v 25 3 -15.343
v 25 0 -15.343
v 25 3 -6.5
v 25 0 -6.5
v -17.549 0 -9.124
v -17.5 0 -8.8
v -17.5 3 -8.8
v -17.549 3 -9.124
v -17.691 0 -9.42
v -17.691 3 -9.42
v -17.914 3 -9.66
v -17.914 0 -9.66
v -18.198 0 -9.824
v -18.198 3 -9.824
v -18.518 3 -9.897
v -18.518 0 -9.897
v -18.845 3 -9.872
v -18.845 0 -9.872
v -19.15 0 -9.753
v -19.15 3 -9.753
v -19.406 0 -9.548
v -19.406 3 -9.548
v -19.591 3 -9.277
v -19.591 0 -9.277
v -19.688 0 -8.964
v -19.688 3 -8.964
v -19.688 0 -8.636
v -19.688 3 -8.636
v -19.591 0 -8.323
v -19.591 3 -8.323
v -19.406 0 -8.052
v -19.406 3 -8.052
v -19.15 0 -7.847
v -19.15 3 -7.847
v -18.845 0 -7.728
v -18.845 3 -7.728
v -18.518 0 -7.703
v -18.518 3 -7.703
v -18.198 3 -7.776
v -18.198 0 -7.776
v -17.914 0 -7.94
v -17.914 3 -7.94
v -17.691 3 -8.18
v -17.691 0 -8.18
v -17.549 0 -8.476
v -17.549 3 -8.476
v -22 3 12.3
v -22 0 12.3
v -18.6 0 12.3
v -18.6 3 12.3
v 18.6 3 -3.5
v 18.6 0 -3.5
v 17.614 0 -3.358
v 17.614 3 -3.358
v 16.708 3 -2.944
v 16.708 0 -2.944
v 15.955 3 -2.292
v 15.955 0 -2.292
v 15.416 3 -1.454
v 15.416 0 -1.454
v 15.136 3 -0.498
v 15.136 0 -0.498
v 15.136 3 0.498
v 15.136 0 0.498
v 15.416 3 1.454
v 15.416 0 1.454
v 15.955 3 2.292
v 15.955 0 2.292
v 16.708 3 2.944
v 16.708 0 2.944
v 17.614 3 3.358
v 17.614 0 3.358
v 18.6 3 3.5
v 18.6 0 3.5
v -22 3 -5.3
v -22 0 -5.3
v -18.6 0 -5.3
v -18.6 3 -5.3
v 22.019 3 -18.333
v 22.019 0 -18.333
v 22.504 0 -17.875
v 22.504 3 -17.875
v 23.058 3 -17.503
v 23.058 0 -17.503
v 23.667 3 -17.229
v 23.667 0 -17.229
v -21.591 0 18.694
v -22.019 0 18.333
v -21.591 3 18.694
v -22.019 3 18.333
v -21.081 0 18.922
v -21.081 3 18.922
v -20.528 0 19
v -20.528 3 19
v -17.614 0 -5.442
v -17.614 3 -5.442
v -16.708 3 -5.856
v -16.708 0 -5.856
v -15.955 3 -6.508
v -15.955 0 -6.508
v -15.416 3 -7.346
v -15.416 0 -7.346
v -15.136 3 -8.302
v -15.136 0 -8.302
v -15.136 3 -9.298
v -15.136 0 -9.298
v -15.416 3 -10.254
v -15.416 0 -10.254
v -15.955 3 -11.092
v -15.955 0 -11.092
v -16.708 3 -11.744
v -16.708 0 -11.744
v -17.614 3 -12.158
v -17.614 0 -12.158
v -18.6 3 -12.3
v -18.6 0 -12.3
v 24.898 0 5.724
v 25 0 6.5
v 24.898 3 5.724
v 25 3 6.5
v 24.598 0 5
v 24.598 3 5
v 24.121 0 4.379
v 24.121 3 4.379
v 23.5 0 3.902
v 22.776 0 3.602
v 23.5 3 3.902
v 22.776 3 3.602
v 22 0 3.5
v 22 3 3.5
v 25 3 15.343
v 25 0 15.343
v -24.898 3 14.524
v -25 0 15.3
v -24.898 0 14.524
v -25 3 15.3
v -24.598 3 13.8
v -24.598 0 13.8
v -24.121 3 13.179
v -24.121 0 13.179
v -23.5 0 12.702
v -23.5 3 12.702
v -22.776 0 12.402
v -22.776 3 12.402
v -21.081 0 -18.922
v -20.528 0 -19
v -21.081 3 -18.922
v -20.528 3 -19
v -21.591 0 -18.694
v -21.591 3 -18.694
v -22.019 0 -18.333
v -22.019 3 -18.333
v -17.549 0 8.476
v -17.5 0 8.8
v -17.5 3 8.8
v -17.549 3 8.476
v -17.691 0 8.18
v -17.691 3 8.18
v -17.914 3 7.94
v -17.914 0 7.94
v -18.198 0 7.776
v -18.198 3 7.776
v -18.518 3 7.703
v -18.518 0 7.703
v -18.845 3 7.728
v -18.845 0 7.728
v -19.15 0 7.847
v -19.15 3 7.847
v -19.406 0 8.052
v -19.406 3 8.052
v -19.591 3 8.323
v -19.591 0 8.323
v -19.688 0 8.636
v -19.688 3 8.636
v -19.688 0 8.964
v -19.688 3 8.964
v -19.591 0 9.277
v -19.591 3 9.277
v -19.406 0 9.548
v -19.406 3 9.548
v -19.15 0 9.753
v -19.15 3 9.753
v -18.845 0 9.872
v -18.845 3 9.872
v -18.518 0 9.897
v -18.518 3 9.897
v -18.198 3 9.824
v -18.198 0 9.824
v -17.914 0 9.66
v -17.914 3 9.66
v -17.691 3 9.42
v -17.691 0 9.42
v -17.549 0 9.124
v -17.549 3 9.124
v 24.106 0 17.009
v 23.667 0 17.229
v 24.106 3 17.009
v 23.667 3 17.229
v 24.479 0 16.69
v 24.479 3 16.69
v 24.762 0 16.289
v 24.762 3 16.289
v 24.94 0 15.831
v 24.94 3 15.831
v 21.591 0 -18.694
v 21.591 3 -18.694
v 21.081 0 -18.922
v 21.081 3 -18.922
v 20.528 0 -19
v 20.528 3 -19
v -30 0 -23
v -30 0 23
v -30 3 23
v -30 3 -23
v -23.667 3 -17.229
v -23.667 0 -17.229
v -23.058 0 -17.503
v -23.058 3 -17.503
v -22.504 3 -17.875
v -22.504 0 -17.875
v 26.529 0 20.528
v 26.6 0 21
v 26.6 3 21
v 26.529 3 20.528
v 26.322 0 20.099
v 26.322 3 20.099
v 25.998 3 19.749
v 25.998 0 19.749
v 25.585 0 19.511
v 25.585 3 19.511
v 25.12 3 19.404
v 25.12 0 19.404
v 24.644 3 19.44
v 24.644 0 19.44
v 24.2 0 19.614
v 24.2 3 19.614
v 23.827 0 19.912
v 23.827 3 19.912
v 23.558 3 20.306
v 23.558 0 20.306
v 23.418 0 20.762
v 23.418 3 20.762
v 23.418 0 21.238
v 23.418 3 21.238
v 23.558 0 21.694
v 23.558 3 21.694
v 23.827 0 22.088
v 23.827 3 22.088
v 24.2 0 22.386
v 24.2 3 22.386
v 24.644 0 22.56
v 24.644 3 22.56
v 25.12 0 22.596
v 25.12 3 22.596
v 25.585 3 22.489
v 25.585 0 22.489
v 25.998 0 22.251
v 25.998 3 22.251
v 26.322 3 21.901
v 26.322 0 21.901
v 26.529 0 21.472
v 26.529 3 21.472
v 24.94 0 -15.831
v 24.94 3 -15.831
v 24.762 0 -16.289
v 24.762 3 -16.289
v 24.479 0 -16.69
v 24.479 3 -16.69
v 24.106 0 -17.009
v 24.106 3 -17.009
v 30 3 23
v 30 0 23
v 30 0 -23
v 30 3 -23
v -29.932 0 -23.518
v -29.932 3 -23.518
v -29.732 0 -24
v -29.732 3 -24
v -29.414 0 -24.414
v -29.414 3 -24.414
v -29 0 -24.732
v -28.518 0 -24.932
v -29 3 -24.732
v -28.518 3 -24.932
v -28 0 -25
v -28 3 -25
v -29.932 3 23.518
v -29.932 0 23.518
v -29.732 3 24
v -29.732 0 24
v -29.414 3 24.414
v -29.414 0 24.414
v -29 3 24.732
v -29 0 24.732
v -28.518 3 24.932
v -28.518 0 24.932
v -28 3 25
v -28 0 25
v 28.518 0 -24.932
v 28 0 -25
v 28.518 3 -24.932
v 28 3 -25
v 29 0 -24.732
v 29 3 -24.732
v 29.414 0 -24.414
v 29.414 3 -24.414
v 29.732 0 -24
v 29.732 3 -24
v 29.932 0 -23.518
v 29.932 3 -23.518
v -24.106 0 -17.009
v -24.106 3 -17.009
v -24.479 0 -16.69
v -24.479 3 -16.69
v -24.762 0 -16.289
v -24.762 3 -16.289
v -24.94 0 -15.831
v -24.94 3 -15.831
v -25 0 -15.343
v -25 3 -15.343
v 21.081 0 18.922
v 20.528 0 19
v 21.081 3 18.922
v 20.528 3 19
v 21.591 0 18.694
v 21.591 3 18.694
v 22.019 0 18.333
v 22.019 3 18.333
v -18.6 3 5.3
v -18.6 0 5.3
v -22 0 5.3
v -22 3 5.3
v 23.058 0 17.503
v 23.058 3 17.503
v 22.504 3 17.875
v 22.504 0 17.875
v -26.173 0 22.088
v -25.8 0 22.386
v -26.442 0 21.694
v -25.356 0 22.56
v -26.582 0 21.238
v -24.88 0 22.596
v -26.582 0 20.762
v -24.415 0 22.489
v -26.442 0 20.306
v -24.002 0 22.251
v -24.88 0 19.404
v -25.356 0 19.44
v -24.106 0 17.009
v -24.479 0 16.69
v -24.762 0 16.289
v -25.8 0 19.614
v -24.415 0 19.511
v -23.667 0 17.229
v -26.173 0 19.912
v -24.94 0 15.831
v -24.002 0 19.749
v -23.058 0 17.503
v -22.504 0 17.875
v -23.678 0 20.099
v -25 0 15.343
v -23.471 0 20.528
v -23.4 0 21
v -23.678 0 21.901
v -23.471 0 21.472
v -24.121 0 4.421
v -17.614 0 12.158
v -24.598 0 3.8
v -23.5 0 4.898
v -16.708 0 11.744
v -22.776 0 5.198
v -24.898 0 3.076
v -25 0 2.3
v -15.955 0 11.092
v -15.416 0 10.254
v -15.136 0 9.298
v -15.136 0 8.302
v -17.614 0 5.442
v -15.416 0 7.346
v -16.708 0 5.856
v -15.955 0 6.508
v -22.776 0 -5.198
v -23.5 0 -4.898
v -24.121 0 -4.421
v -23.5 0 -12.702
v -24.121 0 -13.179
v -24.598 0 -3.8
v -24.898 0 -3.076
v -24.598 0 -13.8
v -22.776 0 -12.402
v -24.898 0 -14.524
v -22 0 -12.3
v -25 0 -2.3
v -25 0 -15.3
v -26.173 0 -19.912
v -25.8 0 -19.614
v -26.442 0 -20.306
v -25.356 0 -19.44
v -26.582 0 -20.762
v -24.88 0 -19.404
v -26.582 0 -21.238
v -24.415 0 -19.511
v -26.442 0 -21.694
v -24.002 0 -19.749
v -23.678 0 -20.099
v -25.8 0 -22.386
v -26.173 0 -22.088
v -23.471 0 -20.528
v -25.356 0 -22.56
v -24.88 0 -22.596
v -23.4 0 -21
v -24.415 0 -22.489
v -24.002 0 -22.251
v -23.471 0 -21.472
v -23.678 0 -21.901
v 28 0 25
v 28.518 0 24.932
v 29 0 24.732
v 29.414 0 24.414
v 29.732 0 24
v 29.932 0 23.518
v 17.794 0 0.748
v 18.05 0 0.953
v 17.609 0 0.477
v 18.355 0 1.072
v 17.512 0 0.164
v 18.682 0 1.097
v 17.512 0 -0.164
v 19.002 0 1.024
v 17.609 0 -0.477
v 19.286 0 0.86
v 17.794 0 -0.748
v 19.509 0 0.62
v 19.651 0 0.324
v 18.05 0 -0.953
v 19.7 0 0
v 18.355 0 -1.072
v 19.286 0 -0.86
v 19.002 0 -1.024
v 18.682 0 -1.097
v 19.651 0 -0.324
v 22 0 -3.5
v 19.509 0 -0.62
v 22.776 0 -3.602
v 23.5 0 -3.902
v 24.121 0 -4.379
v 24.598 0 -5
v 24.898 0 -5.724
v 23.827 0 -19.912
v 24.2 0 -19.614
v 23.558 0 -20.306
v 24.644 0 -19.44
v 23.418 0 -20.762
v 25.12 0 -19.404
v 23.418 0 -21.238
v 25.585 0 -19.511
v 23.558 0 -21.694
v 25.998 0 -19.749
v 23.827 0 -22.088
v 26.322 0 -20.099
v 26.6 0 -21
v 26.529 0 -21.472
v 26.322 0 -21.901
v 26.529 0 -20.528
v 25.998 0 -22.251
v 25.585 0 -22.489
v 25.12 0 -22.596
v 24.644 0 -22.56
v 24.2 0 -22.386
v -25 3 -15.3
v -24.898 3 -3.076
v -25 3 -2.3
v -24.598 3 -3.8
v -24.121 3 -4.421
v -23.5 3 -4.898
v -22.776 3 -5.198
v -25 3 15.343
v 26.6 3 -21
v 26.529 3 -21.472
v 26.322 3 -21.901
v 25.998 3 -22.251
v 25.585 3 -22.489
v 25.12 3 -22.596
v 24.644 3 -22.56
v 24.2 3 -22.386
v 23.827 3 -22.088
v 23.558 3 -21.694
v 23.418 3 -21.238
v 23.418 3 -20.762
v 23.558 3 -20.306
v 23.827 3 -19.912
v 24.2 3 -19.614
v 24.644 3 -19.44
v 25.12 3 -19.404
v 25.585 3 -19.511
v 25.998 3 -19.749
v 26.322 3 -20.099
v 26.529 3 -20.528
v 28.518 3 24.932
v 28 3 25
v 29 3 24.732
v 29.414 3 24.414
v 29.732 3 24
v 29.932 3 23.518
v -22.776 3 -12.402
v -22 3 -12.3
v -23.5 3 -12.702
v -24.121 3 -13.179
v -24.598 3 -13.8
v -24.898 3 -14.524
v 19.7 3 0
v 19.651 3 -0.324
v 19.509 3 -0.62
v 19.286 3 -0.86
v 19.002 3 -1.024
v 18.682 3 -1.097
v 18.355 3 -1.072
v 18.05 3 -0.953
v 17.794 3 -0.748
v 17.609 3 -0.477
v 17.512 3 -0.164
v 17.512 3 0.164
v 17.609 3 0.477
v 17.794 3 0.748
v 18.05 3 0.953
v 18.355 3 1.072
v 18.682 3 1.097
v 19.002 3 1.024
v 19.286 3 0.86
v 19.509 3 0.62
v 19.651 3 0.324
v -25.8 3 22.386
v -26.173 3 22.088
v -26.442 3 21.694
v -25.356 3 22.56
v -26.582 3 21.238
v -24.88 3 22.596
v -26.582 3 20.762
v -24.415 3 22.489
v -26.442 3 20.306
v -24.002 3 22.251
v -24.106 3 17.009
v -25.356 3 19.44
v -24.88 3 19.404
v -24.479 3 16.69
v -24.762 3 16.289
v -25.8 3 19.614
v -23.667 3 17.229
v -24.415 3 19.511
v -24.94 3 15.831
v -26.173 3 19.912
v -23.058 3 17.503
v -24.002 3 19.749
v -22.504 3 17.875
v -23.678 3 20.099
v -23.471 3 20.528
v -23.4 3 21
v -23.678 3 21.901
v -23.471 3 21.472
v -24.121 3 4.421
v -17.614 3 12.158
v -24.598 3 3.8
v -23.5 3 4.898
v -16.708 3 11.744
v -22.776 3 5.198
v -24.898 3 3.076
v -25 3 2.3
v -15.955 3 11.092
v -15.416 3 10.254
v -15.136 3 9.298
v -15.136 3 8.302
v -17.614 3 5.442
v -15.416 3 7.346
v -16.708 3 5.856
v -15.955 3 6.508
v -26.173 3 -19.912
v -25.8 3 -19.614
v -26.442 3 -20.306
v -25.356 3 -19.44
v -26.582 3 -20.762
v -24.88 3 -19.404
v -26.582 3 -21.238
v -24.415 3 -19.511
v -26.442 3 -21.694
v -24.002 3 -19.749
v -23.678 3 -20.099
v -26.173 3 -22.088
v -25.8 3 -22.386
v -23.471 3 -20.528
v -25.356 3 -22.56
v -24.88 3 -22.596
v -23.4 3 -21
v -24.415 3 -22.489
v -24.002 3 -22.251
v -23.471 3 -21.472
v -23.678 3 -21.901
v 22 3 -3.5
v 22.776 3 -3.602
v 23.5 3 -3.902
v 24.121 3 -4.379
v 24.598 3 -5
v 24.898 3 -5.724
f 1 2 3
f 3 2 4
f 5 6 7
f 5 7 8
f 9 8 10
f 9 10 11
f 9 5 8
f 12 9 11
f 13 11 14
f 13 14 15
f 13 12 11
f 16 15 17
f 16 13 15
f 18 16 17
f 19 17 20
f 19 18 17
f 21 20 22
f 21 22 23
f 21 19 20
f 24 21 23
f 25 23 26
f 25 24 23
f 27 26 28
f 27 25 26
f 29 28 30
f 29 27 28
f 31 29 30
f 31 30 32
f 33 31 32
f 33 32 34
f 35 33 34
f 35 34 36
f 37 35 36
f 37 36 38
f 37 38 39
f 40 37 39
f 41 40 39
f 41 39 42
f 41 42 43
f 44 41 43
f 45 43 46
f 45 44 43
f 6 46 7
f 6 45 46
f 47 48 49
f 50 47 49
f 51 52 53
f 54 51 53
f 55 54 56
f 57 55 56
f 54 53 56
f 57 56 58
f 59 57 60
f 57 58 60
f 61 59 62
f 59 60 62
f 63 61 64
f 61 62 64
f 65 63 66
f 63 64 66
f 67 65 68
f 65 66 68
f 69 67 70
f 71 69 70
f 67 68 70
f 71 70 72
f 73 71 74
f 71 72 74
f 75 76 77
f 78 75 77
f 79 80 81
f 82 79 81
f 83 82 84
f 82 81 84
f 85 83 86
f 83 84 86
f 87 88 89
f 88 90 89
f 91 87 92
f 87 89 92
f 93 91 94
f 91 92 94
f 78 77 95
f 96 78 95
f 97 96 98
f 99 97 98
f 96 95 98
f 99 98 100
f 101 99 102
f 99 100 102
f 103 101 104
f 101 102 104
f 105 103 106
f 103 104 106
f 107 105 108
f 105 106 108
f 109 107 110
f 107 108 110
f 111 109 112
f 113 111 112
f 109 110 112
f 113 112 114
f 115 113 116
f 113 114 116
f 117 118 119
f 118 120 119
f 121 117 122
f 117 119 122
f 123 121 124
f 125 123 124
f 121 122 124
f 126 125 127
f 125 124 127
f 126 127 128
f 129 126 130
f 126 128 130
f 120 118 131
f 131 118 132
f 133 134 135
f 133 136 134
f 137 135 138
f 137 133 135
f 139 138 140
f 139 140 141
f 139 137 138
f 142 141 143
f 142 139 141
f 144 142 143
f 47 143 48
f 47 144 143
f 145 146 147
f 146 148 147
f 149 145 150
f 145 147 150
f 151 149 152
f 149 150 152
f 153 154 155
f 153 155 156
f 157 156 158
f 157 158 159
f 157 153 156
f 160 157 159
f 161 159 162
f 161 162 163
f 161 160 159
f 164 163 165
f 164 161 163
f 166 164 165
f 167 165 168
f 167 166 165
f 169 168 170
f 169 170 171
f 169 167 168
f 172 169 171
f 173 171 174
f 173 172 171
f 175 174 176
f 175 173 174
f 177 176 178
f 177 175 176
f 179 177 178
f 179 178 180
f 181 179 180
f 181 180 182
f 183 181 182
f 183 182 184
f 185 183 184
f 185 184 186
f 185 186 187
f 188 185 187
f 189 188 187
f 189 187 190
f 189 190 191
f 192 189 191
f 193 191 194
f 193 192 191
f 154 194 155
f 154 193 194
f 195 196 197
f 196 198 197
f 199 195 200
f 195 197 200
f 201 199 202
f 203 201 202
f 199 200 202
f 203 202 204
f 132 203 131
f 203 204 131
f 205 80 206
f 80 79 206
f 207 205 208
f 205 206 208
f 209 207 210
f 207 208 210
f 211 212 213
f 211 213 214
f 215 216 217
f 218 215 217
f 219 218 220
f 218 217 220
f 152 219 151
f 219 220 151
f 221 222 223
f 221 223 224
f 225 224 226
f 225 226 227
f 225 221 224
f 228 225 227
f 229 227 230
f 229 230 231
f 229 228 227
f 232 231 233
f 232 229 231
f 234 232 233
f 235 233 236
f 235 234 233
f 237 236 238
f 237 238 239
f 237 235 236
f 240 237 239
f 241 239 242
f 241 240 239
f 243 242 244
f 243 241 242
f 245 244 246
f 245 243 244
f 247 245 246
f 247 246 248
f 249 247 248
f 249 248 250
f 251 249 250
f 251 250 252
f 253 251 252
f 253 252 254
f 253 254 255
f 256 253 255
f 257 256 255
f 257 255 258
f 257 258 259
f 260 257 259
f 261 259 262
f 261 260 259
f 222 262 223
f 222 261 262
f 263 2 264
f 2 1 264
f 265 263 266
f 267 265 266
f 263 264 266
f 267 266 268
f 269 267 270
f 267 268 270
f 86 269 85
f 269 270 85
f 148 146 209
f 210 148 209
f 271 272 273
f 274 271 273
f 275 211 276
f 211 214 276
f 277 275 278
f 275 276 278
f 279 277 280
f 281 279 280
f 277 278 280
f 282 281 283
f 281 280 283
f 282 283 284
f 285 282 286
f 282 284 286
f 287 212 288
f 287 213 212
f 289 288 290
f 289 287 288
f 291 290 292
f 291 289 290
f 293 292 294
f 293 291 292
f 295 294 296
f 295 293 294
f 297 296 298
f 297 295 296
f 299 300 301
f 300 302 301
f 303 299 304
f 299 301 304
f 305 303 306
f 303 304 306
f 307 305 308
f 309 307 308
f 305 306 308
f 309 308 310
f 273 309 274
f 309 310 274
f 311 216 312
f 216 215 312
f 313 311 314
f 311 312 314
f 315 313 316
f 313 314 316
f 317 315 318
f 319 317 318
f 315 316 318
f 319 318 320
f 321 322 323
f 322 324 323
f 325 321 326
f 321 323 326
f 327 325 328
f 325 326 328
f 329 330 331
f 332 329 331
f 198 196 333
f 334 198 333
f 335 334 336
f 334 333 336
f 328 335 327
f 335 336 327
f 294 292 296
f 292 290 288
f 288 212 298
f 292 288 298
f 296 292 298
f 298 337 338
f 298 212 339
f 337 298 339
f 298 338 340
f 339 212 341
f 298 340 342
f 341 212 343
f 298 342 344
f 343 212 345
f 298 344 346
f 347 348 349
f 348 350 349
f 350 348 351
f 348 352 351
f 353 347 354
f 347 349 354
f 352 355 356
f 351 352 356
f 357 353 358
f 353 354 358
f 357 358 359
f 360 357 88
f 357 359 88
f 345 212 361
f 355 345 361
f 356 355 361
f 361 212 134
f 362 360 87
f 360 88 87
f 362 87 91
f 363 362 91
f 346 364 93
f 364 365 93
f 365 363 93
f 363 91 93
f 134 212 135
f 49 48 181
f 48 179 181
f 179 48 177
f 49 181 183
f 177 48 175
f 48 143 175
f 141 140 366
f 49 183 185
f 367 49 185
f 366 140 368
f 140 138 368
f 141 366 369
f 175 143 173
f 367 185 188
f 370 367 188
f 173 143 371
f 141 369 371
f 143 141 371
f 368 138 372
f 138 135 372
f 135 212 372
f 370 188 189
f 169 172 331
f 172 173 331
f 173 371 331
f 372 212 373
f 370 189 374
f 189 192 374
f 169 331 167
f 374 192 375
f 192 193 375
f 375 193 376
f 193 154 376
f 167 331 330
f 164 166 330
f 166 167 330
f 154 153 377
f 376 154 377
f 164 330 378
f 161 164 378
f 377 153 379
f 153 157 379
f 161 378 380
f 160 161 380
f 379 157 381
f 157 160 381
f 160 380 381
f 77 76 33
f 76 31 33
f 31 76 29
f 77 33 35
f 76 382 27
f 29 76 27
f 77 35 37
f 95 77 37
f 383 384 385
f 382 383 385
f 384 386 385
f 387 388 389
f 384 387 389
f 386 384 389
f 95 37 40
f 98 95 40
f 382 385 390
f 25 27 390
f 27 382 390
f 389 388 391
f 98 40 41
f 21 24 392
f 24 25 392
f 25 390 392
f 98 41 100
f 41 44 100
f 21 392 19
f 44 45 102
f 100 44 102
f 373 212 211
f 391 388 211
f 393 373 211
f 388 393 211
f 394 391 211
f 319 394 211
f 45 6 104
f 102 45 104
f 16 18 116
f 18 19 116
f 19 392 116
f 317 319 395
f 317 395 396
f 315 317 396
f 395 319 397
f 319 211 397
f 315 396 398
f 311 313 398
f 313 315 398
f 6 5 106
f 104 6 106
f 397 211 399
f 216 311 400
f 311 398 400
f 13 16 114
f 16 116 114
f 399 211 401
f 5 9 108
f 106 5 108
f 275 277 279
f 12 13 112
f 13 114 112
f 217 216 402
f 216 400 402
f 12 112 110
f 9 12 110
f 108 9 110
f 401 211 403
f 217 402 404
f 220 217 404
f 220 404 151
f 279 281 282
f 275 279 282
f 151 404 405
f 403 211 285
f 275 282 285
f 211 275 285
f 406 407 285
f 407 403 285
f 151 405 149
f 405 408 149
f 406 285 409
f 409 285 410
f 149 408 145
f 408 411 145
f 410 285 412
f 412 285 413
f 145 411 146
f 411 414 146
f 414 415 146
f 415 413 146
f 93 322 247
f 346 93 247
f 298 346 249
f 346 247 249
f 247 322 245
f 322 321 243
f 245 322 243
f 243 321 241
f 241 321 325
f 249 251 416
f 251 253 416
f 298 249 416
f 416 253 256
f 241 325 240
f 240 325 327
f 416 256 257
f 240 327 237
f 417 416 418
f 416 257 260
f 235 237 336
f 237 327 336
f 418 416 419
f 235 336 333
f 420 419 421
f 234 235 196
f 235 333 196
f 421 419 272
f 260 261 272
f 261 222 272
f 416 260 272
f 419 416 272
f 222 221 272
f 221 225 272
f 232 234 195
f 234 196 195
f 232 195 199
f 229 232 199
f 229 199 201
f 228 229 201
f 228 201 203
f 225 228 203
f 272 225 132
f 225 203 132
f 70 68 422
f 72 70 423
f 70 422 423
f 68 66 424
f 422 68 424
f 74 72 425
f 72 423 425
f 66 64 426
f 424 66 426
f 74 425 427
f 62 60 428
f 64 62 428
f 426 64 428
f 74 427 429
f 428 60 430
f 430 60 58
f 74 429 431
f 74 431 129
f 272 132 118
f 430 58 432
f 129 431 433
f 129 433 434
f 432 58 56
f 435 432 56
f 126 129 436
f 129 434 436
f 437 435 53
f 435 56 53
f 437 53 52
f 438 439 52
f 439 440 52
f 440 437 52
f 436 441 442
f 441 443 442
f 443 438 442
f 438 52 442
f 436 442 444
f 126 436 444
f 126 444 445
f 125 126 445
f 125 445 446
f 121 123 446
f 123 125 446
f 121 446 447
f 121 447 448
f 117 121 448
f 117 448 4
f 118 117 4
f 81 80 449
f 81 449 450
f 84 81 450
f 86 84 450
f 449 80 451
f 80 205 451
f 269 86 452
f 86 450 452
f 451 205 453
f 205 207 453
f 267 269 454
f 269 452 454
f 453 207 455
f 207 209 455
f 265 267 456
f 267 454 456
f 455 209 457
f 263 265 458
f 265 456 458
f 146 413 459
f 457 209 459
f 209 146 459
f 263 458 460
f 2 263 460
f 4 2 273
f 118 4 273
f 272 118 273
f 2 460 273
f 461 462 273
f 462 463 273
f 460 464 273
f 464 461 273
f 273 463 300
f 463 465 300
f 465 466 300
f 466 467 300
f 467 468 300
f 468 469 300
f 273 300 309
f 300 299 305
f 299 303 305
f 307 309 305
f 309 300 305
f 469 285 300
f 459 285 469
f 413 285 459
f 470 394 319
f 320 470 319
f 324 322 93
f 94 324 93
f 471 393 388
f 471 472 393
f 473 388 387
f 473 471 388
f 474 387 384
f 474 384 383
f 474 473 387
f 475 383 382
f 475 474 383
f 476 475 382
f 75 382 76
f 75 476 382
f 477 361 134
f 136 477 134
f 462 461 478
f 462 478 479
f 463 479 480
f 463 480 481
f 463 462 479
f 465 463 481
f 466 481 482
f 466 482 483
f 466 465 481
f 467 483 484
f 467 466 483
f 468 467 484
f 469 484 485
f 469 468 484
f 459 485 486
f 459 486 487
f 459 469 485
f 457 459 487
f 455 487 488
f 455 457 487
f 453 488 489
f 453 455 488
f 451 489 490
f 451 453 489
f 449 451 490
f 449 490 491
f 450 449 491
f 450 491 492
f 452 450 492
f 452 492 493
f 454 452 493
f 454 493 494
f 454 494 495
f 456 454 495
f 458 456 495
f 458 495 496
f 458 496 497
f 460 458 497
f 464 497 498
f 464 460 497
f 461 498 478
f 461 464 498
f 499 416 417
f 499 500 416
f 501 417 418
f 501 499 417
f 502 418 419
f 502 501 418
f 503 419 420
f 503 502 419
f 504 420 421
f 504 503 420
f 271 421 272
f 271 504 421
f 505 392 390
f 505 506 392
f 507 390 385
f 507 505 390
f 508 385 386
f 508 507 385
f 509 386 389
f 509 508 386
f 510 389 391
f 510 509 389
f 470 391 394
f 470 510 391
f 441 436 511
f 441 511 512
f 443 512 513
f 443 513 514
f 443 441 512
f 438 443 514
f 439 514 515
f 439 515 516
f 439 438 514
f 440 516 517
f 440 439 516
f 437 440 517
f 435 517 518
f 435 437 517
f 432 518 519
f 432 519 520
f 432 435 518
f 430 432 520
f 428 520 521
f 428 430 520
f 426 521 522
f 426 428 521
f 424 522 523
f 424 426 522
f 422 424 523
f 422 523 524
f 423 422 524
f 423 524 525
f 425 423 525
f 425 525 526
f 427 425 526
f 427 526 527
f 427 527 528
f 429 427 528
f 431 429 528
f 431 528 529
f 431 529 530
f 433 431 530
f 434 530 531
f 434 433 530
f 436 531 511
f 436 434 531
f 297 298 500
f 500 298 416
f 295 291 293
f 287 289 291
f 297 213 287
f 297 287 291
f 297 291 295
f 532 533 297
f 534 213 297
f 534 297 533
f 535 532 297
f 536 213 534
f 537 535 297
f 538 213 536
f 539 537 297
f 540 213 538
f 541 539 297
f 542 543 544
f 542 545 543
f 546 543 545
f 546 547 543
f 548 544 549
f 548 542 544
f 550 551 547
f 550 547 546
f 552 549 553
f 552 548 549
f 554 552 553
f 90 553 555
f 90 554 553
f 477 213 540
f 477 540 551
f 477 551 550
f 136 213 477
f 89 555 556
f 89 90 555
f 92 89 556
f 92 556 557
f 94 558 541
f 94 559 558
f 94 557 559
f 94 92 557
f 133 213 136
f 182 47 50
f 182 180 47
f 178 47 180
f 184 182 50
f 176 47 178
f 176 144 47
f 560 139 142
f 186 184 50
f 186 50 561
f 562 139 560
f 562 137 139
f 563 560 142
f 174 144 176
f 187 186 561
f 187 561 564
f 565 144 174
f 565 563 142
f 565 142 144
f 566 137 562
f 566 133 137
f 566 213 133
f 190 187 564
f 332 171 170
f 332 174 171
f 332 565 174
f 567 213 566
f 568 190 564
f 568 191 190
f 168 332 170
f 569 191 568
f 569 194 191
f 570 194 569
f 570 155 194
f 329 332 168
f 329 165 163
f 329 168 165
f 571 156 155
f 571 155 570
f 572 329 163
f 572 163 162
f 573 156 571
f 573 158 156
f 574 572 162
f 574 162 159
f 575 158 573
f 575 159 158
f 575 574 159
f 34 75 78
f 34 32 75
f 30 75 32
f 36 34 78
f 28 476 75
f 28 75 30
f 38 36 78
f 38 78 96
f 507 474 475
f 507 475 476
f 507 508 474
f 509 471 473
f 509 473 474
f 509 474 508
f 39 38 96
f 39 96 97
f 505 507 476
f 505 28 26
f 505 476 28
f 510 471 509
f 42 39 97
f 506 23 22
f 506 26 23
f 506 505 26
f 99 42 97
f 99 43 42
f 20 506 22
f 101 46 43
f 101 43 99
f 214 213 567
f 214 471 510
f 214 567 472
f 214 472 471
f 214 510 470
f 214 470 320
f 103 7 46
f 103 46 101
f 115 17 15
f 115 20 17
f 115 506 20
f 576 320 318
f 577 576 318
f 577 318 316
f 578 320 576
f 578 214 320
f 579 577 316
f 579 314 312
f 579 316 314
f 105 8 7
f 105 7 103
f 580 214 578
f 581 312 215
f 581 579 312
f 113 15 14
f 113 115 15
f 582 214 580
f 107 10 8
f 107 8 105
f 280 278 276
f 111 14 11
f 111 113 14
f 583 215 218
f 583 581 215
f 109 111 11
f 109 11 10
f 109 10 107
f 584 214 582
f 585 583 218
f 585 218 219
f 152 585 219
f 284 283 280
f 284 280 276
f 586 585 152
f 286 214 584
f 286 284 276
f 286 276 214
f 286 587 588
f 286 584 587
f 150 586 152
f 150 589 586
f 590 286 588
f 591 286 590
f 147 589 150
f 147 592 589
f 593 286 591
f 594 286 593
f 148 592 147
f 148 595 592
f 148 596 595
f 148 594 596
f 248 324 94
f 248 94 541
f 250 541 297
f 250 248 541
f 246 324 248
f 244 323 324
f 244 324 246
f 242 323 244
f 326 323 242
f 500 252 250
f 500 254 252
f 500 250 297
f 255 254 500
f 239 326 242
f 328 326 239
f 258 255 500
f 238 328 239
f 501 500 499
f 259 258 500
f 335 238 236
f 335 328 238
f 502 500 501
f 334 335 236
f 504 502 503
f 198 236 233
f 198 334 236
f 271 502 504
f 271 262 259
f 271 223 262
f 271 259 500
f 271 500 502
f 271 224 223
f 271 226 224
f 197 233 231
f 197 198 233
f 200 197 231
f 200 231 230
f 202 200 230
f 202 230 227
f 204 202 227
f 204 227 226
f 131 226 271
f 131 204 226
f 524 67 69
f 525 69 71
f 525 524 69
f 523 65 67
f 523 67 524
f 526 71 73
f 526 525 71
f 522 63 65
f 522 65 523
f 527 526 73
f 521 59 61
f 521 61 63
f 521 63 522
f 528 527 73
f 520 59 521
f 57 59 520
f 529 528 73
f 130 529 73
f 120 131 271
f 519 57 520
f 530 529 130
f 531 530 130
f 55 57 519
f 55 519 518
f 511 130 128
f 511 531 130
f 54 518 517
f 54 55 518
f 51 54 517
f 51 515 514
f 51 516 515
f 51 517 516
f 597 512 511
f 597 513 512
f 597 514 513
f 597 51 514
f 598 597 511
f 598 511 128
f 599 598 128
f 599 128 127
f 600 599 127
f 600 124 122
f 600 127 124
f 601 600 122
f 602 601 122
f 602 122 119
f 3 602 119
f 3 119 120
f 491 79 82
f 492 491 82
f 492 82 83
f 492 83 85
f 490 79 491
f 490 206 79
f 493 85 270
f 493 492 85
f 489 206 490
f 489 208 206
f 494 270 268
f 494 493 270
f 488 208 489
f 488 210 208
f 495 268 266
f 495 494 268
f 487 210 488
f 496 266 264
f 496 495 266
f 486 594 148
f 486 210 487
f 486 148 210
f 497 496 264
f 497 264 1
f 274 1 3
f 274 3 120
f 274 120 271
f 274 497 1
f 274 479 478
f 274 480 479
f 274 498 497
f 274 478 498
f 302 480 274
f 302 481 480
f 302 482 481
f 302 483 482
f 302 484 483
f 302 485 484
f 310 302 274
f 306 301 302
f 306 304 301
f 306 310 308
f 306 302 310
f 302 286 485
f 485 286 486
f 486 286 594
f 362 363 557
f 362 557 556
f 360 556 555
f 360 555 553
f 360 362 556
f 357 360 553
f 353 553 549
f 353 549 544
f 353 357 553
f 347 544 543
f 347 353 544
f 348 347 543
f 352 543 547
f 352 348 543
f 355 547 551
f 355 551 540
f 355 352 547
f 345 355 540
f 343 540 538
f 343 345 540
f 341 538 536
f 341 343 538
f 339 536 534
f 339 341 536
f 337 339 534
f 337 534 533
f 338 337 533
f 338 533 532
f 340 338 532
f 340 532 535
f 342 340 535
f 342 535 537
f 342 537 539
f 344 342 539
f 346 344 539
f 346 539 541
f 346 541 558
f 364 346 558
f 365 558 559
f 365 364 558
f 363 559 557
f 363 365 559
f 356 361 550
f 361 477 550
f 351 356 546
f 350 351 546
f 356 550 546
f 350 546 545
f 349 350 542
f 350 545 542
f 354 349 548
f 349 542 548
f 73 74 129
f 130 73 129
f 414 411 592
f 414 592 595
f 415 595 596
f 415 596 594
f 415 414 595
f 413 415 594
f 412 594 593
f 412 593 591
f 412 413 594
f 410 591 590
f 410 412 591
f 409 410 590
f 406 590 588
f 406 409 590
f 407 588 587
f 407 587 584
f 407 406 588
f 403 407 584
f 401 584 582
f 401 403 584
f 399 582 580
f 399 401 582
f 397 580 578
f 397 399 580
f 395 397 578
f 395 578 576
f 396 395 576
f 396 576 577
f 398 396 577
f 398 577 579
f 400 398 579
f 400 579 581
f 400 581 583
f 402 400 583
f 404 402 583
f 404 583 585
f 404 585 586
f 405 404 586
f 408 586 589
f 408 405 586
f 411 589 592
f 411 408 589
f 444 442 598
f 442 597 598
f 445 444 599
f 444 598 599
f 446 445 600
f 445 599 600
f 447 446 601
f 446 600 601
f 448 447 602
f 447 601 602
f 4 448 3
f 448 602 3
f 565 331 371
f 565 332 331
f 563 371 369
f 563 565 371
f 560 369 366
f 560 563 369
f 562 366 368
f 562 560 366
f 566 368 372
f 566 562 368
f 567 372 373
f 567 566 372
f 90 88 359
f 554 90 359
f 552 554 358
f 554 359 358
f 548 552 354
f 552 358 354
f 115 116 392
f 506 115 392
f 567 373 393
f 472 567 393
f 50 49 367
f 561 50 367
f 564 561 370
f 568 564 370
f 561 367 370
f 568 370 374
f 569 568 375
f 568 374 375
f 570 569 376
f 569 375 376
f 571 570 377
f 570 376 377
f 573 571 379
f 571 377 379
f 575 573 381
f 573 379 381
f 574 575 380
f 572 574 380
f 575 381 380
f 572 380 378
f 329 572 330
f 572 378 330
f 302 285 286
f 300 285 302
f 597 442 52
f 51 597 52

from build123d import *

# Parameters (mm, degrees)
SKETCH_1_W      = 60
SKETCH_1_H      = 50
SKETCH_1_R      = 1.6
SKETCH_1_R_2    = 1.1
EXTRUDE_1_DEPTH = 3
FILLET_1_R      = 2
FILLET_2_R      = 2
FILLET_3_R      = 3


with BuildPart() as part:
    # 草图1 → 凸台-拉伸1 (new body)
    with BuildSketch(Plane(origin=(0, 0, 0), x_dir=(1, 0, 0), z_dir=(0, 1, 0))):
        Rectangle(SKETCH_1_W, SKETCH_1_H)
        with Locations((-25, 21)):
            Circle(SKETCH_1_R, mode=Mode.SUBTRACT)
        with Locations((25, 21)):
            Circle(SKETCH_1_R, mode=Mode.SUBTRACT)
        with Locations((25, -21)):
            Circle(SKETCH_1_R, mode=Mode.SUBTRACT)
        with Locations((-25, -21)):
            Circle(SKETCH_1_R, mode=Mode.SUBTRACT)
        with Locations((18.6, 0)):
            Circle(SKETCH_1_R_2, mode=Mode.SUBTRACT)
        with Locations((-18.6, 8.8)):
            Circle(SKETCH_1_R_2, mode=Mode.SUBTRACT)
        with Locations((-18.6, -8.8)):
            Circle(SKETCH_1_R_2, mode=Mode.SUBTRACT)
        with BuildLine():
            Line((-25, -5.3), (-25, 5.3))
            Line((-25, 5.3), (-18.6, 5.3))
            ThreePointArc((-18.6, 5.3), (-15.1, 8.8), (-18.6, 12.3))
            Line((-18.6, 12.3), (-25, 12.3))
            Line((-25, 12.3), (-25, 17))
            ThreePointArc((-25, 17), (-23, 17.535898385), (-21.535898385, 19))
            Line((-21.535898385, 19), (21.535898385, 19))
            ThreePointArc((21.535898385, 19), (23, 17.535898385), (25, 17))
            Line((25, 17), (25, 3.5))
            Line((25, 3.5), (18.6, 3.5))
            ThreePointArc((18.6, 3.5), (15.1, 0), (18.6, -3.5))
            Line((18.6, -3.5), (25, -3.5))
            Line((25, -3.5), (25, -17))
            ThreePointArc((25, -17), (23, -17.535898385), (21.535898385, -19))
            Line((21.535898385, -19), (-21.535898385, -19))
            ThreePointArc((-21.535898385, -19), (-23, -17.535898385), (-25, -17))
            Line((-25, -17), (-25, -12.3))
            Line((-25, -12.3), (-18.6, -12.3))
            ThreePointArc((-18.6, -12.3), (-15.1, -8.8), (-18.6, -5.3))
            Line((-18.6, -5.3), (-25, -5.3))
        make_face(mode=Mode.SUBTRACT)
    extrude(amount=EXTRUDE_1_DEPTH)

    # 圆角1
    fillet_1_edges = [part.edges().sort_by_distance(p)[0] for p in [
        (30, 1.5, 25),
        (-30, 1.5, 25),
        (-30, 1.5, -25),
        (30, 1.5, -25),
    ]]
    fillet(fillet_1_edges, radius=FILLET_1_R)

    # 圆角2
    fillet_2_edges = [part.edges().sort_by_distance(p)[0] for p in [
        (-25, 1.5, 17),
        (-21.535898385, 1.5, 19),
        (21.535898385, 1.5, 19),
        (25, 1.5, 17),
        (25, 1.5, -17),
        (21.535898385, 1.5, -19),
        (-21.535898385, 1.5, -19),
        (-25, 1.5, -17),
    ]]
    fillet(fillet_2_edges, radius=FILLET_2_R)

    # 圆角3
    fillet_3_edges = [part.edges().sort_by_distance(p)[0] for p in [
        (-25, 1.5, -5.3),
        (-25, 1.5, 5.3),
        (-25, 1.5, 12.3),
        (25, 1.5, 3.5),
        (25, 1.5, -3.5),
        (-25, 1.5, -12.3),
    ]]
    fillet(fillet_3_edges, radius=FILLET_3_R)


solid = part.part
